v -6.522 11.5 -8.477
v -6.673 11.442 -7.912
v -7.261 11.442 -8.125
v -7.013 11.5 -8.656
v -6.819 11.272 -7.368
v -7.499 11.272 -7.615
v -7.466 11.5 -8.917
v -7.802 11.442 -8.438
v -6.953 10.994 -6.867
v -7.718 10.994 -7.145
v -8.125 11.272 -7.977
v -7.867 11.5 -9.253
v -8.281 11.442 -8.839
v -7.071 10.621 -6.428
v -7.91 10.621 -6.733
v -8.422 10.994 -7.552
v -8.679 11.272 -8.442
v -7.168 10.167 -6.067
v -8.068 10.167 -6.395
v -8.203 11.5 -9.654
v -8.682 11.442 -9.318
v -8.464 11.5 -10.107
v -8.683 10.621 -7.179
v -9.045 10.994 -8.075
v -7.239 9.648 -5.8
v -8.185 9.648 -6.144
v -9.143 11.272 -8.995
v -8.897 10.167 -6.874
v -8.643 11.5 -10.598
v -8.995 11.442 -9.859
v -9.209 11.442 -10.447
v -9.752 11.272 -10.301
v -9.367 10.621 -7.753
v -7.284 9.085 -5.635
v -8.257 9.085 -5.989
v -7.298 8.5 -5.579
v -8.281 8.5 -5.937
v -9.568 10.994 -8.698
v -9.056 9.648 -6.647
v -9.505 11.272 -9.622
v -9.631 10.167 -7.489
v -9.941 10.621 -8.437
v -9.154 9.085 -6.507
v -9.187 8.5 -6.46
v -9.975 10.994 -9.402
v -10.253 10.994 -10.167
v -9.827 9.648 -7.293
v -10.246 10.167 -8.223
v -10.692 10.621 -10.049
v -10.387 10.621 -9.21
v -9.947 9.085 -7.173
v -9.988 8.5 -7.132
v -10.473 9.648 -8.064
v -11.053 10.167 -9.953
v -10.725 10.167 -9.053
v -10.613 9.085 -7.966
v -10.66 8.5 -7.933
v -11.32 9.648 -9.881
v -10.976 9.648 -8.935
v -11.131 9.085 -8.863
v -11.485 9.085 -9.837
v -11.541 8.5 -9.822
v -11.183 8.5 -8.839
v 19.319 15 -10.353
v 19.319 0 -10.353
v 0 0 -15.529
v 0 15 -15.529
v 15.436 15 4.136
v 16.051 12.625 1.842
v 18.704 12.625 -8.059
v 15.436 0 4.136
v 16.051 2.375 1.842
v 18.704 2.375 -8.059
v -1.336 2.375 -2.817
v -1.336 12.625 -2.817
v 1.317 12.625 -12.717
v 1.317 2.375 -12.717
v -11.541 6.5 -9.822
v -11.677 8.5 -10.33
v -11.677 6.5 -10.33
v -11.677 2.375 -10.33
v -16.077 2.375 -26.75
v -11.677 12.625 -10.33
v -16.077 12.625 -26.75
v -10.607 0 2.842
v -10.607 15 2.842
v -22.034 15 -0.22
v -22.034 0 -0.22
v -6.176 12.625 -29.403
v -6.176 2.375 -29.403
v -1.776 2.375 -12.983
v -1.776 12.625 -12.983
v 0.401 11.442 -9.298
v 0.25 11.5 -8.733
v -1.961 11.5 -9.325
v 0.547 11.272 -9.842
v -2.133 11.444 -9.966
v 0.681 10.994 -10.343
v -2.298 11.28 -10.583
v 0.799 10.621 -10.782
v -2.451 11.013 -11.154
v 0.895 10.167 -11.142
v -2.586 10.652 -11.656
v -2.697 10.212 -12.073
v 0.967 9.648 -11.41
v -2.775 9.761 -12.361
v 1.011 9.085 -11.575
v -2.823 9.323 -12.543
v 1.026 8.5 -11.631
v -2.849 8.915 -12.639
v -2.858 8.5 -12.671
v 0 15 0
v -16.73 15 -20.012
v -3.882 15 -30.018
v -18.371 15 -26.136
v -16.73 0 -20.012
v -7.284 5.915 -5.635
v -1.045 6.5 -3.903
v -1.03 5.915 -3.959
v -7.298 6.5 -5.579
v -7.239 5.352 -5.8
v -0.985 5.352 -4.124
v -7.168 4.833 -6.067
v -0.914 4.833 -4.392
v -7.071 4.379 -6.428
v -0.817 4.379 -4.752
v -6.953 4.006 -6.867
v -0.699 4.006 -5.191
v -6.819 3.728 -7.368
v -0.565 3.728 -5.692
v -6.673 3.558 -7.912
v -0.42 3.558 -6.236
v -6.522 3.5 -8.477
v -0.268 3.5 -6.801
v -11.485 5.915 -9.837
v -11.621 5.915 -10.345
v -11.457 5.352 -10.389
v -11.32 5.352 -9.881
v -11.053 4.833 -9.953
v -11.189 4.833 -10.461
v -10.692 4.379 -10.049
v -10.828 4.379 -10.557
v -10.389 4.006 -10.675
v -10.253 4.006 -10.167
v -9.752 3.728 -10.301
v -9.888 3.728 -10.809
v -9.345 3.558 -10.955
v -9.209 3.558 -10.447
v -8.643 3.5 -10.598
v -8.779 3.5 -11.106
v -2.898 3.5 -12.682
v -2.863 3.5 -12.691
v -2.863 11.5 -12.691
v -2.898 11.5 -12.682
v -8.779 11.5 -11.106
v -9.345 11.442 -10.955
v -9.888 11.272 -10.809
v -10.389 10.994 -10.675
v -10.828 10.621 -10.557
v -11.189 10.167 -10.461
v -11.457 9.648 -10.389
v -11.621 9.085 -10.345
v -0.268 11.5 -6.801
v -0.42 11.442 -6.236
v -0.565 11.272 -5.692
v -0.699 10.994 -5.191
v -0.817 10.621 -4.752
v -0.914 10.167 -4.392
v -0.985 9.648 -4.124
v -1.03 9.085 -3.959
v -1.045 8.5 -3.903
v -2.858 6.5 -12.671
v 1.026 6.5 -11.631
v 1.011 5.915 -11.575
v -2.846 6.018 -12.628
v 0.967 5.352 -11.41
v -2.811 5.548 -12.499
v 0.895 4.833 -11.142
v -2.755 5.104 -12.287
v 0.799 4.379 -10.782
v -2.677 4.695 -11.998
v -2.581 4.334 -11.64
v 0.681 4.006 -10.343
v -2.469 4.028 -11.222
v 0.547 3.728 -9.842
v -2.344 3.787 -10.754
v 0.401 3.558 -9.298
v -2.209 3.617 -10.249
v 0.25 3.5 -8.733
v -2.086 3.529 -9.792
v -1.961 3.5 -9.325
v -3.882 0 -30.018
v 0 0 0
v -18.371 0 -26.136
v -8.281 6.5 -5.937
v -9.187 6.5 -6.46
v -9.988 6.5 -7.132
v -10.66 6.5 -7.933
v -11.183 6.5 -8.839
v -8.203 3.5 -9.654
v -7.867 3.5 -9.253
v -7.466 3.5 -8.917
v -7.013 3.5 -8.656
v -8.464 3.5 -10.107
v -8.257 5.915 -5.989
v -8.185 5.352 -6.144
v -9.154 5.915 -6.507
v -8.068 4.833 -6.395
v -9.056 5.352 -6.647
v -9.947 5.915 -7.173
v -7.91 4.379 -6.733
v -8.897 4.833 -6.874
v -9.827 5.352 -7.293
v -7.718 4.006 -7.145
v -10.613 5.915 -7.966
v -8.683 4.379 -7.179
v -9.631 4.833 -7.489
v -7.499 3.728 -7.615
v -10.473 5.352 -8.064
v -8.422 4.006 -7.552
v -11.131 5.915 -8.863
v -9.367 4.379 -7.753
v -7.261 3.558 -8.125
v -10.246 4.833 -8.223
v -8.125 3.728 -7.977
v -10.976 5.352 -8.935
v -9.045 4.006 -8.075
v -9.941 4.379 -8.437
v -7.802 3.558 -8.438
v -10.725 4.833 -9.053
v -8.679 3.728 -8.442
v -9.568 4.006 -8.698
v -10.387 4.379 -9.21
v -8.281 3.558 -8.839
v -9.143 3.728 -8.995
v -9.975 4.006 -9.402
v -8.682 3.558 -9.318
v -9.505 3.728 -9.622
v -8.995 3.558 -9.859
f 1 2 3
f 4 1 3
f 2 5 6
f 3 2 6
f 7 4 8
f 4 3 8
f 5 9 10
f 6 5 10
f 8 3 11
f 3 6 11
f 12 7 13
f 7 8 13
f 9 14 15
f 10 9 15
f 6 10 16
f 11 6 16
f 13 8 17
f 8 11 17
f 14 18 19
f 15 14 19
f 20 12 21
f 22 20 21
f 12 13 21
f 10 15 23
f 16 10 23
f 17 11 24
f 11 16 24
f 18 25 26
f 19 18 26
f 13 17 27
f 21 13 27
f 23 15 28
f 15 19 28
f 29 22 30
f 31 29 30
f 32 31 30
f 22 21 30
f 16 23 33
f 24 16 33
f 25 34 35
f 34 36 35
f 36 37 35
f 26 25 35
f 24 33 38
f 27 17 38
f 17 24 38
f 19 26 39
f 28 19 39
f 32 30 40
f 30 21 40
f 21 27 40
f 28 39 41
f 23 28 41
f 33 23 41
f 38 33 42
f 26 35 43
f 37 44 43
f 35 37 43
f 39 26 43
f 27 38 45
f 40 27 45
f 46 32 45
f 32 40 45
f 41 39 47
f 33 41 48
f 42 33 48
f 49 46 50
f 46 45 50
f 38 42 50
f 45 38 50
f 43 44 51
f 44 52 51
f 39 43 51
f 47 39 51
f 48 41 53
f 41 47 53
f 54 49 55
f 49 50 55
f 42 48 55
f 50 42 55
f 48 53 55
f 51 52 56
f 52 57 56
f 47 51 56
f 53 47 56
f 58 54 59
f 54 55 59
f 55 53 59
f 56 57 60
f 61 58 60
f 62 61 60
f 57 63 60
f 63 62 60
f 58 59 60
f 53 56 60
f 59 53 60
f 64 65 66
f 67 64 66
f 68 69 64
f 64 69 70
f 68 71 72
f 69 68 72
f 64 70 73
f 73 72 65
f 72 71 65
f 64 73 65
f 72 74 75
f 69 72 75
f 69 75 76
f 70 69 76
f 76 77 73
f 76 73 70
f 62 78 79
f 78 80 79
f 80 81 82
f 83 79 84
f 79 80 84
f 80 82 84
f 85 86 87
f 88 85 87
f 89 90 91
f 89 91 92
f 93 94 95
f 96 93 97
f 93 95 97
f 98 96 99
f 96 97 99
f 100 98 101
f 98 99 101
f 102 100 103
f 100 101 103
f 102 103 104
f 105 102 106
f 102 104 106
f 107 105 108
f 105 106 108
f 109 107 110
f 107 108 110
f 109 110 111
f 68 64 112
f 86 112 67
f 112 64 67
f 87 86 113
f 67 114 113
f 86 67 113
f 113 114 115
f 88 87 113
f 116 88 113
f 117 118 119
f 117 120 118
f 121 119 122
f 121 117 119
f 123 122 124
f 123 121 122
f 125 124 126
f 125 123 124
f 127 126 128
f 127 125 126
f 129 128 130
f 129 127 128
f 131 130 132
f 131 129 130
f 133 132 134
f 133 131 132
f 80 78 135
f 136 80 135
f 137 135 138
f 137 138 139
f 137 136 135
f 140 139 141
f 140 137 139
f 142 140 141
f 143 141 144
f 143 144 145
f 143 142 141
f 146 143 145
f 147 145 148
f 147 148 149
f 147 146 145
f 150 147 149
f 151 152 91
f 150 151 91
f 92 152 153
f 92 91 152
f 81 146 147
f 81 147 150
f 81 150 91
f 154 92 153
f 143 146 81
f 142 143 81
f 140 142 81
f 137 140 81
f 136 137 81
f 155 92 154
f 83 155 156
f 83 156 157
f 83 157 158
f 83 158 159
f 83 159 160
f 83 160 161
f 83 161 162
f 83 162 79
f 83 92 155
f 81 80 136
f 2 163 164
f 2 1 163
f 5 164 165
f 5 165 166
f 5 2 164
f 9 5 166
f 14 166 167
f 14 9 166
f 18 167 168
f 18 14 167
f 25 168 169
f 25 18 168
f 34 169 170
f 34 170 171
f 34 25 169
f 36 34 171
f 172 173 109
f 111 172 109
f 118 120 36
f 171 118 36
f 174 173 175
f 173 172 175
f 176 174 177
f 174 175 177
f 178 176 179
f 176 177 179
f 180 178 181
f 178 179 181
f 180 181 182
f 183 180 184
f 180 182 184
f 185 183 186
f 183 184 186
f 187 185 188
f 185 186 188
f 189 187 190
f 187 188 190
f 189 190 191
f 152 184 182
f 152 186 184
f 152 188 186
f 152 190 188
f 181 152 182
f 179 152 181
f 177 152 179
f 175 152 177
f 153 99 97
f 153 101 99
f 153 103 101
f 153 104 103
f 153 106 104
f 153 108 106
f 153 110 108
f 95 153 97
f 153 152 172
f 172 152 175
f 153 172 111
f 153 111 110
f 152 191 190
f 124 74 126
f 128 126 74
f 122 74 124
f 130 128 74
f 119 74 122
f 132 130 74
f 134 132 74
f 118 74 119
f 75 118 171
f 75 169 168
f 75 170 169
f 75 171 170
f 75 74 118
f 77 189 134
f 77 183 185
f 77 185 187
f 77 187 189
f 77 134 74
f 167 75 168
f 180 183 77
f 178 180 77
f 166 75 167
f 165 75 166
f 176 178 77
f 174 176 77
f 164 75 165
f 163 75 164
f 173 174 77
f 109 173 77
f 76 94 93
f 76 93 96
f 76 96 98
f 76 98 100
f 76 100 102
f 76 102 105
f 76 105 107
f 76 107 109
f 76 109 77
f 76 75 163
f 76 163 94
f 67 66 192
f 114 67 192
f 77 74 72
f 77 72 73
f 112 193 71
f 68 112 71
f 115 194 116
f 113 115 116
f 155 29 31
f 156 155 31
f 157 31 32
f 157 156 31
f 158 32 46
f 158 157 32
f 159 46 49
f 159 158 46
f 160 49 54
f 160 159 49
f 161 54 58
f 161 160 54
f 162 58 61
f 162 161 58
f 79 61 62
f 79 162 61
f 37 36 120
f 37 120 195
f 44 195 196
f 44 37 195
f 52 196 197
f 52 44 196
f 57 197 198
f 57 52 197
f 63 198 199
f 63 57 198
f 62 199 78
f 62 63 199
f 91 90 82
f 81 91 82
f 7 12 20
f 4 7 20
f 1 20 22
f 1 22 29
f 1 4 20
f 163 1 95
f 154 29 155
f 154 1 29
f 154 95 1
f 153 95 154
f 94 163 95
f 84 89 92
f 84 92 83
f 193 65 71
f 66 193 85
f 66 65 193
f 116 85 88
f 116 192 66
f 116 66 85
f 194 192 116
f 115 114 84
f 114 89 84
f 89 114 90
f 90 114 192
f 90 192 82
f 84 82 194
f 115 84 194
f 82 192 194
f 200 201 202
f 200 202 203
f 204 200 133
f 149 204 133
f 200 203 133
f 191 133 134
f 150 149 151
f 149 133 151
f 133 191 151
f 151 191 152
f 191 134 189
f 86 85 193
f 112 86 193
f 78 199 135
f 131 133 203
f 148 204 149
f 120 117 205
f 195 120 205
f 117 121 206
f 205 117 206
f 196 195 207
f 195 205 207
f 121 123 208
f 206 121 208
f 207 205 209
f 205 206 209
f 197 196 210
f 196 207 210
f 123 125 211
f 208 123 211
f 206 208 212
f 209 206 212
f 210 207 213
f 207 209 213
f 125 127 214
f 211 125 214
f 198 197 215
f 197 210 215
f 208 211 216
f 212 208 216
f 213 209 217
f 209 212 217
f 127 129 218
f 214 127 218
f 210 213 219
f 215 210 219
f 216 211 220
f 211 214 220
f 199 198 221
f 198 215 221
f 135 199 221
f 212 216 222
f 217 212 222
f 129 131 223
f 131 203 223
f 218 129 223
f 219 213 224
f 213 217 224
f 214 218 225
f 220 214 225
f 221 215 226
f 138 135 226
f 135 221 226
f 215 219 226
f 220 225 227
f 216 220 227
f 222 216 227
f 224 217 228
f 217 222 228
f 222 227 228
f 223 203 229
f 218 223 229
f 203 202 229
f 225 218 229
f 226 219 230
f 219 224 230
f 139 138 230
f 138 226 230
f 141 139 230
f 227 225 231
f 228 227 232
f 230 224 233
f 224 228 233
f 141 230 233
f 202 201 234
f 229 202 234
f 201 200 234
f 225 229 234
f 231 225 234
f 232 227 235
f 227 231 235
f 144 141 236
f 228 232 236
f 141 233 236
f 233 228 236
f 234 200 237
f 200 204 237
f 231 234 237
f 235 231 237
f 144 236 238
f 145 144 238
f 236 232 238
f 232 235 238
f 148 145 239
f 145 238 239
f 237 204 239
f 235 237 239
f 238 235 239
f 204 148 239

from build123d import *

# Parameters (mm, degrees)
BOSS_EXTRUDE1_DEPTH = 15
SKETCH2_W           = 10.25
SKETCH2_H           = 10.25
CUT_EXTRUDE1_DEPTH  = 18
SKETCH3_W           = 10.25
SKETCH3_H           = 10.25
CUT_EXTRUDE2_DEPTH  = 17
CUT_EXTRUDE3_REACH  = 41.336
SKETCH4_W           = 8
SKETCH4_H           = 8
CUT_EXTRUDE4_REACH  = 34.317
SKETCH5_W           = 8
SKETCH5_H           = 8
FILLET1_R           = 6
FILLET2_R           = 3
BOSS_EXTRUDE2_DEPTH = 15


with BuildPart() as part:
    # Sketch1 → Boss-Extrude1 (new body)
    with BuildSketch(Plane(origin=(0, 0, 0), x_dir=(1, 0, 0), z_dir=(0, 1, 0))):
        Polygon((0, 0), (15.436230849, -4.13612559), (19.318516526, 10.352761804), (0, 15.529142706), (-3.882285677, 30.0180301), (-18.371173071, 26.135744424), (-10.606601718, -2.842030365), align=None)
    extrude(amount=BOSS_EXTRUDE1_DEPTH)

    # Sketch2 → Cut-Extrude1 (cut)
    with BuildSketch(Plane(origin=(15.436230849, 0, 4.13612559), x_dir=(0.2588190451025214, 0, -0.9659258262890681), z_dir=(0.9659258262890681, 0, 0.2588190451025214))):
        with Locations((7.5, 7.5)):
            Rectangle(SKETCH2_W, SKETCH2_H)
    extrude(amount=-CUT_EXTRUDE1_DEPTH, mode=Mode.SUBTRACT)

    # Sketch3 → Cut-Extrude2 (cut)
    with BuildSketch(Plane(origin=(-7.764571353, 0, -28.977774789), x_dir=(-0.9659258262890682, 0, 0.2588190451025212), z_dir=(-0.2588190451025212, 0, -0.9659258262890682))):
        with Locations((3.480762114, 7.5)):
            Rectangle(SKETCH3_W, SKETCH3_H)
    extrude(amount=-CUT_EXTRUDE2_DEPTH, mode=Mode.SUBTRACT)

    # Cut-Extrude3: up to this plane
    cut_extrude3_end = Plane(origin=(-11.677175467, 12.625, -10.329700609), z_dir=(-0.9659258262890682, 0, 0.2588190451025212))
    # Sketch4 → Cut-Extrude3 (cut, up to the surface)
    with BuildSketch(Plane(origin=(-1.950434024, 0, -0.522617222), x_dir=(0.25881904510252146, 0, -0.9659258262890681), z_dir=(0.9659258262890681, 0, 0.25881904510252146)), mode=Mode.PRIVATE) as cut_extrude3_sk1:
        with Locations((7.5, 7.5)):
            Rectangle(SKETCH4_W, SKETCH4_H)
    cut_extrude3_tool1 = split(extrude(cut_extrude3_sk1.sketch, amount=-CUT_EXTRUDE3_REACH, mode=Mode.PRIVATE), bisect_by=cut_extrude3_end, keep=Keep.BOTH, mode=Mode.PRIVATE)
    add(cut_extrude3_tool1.solids().sort_by_distance((-0.009291, 7.5, -7.767061))[0], mode=Mode.SUBTRACT)

    # Cut-Extrude4: up to this face of the body (flat: up to its plane)
    cut_extrude4_end = Plane(part.part.faces().sort_by_distance((-5.844526251, 7.5, -5.189502721))[0])
    # Sketch5 → Cut-Extrude4 (cut, up to the picked face)
    with BuildSketch(Plane(origin=(-3.364647586, 0, -12.557035742), x_dir=(-0.9659258262890682, 0, 0.25881904510252124), z_dir=(-0.25881904510252124, 0, -0.9659258262890682)), mode=Mode.PRIVATE) as cut_extrude4_sk1:
        with Locations((3.480762114, 7.5)):
            Rectangle(SKETCH5_W, SKETCH5_H)
    cut_extrude4_tool1 = split(extrude(cut_extrude4_sk1.sketch, amount=-CUT_EXTRUDE4_REACH, mode=Mode.PRIVATE), bisect_by=cut_extrude4_end, keep=Keep.BOTH, mode=Mode.PRIVATE)
    add(cut_extrude4_tool1.solids().sort_by(Axis((-6.726806, 7.5, -11.656148), (0.25881904510252124, 0, 0.9659258262890682)))[0], mode=Mode.SUBTRACT)

    # Fillet1
    fillet1_edges = [part.edges().sort_by_distance(p)[0] for p in [
        (-10.644485136, 7.5, -6.475647828),
    ]]
    fillet(fillet1_edges, radius=FILLET1_R)

    # Fillet2
    fillet2_edges = [part.edges().sort_by_distance(p)[0] for p in [
        (-11.609118038, 11.5, -10.075706826),
        (-0.915876519, 11.5, -12.151084448),
        (-0.915876519, 3.5, -12.151084448),
        (-11.609118038, 3.5, -10.075706826),
        (-4.171493644, 3.5, -4.741214984),
        (-9.988146338, 3.5, -7.131986626),
        (-4.171493644, 11.5, -4.741214984),
        (-9.988146338, 11.5, -7.131986626),
    ]]
    fillet(fillet2_edges, radius=FILLET2_R)

    # Sketch6 → Boss-Extrude2 (add)
    with BuildSketch(Plane(origin=(0, 15, 0), x_dir=(1, 0, 0), z_dir=(0, 1, 0))):
        Polygon((-10.606601718, -2.842030365), (-22.033626934, 0.219831814), (-16.730326075, 20.012020067), align=None)
    extrude(amount=-BOSS_EXTRUDE2_DEPTH)


solid = part.part
